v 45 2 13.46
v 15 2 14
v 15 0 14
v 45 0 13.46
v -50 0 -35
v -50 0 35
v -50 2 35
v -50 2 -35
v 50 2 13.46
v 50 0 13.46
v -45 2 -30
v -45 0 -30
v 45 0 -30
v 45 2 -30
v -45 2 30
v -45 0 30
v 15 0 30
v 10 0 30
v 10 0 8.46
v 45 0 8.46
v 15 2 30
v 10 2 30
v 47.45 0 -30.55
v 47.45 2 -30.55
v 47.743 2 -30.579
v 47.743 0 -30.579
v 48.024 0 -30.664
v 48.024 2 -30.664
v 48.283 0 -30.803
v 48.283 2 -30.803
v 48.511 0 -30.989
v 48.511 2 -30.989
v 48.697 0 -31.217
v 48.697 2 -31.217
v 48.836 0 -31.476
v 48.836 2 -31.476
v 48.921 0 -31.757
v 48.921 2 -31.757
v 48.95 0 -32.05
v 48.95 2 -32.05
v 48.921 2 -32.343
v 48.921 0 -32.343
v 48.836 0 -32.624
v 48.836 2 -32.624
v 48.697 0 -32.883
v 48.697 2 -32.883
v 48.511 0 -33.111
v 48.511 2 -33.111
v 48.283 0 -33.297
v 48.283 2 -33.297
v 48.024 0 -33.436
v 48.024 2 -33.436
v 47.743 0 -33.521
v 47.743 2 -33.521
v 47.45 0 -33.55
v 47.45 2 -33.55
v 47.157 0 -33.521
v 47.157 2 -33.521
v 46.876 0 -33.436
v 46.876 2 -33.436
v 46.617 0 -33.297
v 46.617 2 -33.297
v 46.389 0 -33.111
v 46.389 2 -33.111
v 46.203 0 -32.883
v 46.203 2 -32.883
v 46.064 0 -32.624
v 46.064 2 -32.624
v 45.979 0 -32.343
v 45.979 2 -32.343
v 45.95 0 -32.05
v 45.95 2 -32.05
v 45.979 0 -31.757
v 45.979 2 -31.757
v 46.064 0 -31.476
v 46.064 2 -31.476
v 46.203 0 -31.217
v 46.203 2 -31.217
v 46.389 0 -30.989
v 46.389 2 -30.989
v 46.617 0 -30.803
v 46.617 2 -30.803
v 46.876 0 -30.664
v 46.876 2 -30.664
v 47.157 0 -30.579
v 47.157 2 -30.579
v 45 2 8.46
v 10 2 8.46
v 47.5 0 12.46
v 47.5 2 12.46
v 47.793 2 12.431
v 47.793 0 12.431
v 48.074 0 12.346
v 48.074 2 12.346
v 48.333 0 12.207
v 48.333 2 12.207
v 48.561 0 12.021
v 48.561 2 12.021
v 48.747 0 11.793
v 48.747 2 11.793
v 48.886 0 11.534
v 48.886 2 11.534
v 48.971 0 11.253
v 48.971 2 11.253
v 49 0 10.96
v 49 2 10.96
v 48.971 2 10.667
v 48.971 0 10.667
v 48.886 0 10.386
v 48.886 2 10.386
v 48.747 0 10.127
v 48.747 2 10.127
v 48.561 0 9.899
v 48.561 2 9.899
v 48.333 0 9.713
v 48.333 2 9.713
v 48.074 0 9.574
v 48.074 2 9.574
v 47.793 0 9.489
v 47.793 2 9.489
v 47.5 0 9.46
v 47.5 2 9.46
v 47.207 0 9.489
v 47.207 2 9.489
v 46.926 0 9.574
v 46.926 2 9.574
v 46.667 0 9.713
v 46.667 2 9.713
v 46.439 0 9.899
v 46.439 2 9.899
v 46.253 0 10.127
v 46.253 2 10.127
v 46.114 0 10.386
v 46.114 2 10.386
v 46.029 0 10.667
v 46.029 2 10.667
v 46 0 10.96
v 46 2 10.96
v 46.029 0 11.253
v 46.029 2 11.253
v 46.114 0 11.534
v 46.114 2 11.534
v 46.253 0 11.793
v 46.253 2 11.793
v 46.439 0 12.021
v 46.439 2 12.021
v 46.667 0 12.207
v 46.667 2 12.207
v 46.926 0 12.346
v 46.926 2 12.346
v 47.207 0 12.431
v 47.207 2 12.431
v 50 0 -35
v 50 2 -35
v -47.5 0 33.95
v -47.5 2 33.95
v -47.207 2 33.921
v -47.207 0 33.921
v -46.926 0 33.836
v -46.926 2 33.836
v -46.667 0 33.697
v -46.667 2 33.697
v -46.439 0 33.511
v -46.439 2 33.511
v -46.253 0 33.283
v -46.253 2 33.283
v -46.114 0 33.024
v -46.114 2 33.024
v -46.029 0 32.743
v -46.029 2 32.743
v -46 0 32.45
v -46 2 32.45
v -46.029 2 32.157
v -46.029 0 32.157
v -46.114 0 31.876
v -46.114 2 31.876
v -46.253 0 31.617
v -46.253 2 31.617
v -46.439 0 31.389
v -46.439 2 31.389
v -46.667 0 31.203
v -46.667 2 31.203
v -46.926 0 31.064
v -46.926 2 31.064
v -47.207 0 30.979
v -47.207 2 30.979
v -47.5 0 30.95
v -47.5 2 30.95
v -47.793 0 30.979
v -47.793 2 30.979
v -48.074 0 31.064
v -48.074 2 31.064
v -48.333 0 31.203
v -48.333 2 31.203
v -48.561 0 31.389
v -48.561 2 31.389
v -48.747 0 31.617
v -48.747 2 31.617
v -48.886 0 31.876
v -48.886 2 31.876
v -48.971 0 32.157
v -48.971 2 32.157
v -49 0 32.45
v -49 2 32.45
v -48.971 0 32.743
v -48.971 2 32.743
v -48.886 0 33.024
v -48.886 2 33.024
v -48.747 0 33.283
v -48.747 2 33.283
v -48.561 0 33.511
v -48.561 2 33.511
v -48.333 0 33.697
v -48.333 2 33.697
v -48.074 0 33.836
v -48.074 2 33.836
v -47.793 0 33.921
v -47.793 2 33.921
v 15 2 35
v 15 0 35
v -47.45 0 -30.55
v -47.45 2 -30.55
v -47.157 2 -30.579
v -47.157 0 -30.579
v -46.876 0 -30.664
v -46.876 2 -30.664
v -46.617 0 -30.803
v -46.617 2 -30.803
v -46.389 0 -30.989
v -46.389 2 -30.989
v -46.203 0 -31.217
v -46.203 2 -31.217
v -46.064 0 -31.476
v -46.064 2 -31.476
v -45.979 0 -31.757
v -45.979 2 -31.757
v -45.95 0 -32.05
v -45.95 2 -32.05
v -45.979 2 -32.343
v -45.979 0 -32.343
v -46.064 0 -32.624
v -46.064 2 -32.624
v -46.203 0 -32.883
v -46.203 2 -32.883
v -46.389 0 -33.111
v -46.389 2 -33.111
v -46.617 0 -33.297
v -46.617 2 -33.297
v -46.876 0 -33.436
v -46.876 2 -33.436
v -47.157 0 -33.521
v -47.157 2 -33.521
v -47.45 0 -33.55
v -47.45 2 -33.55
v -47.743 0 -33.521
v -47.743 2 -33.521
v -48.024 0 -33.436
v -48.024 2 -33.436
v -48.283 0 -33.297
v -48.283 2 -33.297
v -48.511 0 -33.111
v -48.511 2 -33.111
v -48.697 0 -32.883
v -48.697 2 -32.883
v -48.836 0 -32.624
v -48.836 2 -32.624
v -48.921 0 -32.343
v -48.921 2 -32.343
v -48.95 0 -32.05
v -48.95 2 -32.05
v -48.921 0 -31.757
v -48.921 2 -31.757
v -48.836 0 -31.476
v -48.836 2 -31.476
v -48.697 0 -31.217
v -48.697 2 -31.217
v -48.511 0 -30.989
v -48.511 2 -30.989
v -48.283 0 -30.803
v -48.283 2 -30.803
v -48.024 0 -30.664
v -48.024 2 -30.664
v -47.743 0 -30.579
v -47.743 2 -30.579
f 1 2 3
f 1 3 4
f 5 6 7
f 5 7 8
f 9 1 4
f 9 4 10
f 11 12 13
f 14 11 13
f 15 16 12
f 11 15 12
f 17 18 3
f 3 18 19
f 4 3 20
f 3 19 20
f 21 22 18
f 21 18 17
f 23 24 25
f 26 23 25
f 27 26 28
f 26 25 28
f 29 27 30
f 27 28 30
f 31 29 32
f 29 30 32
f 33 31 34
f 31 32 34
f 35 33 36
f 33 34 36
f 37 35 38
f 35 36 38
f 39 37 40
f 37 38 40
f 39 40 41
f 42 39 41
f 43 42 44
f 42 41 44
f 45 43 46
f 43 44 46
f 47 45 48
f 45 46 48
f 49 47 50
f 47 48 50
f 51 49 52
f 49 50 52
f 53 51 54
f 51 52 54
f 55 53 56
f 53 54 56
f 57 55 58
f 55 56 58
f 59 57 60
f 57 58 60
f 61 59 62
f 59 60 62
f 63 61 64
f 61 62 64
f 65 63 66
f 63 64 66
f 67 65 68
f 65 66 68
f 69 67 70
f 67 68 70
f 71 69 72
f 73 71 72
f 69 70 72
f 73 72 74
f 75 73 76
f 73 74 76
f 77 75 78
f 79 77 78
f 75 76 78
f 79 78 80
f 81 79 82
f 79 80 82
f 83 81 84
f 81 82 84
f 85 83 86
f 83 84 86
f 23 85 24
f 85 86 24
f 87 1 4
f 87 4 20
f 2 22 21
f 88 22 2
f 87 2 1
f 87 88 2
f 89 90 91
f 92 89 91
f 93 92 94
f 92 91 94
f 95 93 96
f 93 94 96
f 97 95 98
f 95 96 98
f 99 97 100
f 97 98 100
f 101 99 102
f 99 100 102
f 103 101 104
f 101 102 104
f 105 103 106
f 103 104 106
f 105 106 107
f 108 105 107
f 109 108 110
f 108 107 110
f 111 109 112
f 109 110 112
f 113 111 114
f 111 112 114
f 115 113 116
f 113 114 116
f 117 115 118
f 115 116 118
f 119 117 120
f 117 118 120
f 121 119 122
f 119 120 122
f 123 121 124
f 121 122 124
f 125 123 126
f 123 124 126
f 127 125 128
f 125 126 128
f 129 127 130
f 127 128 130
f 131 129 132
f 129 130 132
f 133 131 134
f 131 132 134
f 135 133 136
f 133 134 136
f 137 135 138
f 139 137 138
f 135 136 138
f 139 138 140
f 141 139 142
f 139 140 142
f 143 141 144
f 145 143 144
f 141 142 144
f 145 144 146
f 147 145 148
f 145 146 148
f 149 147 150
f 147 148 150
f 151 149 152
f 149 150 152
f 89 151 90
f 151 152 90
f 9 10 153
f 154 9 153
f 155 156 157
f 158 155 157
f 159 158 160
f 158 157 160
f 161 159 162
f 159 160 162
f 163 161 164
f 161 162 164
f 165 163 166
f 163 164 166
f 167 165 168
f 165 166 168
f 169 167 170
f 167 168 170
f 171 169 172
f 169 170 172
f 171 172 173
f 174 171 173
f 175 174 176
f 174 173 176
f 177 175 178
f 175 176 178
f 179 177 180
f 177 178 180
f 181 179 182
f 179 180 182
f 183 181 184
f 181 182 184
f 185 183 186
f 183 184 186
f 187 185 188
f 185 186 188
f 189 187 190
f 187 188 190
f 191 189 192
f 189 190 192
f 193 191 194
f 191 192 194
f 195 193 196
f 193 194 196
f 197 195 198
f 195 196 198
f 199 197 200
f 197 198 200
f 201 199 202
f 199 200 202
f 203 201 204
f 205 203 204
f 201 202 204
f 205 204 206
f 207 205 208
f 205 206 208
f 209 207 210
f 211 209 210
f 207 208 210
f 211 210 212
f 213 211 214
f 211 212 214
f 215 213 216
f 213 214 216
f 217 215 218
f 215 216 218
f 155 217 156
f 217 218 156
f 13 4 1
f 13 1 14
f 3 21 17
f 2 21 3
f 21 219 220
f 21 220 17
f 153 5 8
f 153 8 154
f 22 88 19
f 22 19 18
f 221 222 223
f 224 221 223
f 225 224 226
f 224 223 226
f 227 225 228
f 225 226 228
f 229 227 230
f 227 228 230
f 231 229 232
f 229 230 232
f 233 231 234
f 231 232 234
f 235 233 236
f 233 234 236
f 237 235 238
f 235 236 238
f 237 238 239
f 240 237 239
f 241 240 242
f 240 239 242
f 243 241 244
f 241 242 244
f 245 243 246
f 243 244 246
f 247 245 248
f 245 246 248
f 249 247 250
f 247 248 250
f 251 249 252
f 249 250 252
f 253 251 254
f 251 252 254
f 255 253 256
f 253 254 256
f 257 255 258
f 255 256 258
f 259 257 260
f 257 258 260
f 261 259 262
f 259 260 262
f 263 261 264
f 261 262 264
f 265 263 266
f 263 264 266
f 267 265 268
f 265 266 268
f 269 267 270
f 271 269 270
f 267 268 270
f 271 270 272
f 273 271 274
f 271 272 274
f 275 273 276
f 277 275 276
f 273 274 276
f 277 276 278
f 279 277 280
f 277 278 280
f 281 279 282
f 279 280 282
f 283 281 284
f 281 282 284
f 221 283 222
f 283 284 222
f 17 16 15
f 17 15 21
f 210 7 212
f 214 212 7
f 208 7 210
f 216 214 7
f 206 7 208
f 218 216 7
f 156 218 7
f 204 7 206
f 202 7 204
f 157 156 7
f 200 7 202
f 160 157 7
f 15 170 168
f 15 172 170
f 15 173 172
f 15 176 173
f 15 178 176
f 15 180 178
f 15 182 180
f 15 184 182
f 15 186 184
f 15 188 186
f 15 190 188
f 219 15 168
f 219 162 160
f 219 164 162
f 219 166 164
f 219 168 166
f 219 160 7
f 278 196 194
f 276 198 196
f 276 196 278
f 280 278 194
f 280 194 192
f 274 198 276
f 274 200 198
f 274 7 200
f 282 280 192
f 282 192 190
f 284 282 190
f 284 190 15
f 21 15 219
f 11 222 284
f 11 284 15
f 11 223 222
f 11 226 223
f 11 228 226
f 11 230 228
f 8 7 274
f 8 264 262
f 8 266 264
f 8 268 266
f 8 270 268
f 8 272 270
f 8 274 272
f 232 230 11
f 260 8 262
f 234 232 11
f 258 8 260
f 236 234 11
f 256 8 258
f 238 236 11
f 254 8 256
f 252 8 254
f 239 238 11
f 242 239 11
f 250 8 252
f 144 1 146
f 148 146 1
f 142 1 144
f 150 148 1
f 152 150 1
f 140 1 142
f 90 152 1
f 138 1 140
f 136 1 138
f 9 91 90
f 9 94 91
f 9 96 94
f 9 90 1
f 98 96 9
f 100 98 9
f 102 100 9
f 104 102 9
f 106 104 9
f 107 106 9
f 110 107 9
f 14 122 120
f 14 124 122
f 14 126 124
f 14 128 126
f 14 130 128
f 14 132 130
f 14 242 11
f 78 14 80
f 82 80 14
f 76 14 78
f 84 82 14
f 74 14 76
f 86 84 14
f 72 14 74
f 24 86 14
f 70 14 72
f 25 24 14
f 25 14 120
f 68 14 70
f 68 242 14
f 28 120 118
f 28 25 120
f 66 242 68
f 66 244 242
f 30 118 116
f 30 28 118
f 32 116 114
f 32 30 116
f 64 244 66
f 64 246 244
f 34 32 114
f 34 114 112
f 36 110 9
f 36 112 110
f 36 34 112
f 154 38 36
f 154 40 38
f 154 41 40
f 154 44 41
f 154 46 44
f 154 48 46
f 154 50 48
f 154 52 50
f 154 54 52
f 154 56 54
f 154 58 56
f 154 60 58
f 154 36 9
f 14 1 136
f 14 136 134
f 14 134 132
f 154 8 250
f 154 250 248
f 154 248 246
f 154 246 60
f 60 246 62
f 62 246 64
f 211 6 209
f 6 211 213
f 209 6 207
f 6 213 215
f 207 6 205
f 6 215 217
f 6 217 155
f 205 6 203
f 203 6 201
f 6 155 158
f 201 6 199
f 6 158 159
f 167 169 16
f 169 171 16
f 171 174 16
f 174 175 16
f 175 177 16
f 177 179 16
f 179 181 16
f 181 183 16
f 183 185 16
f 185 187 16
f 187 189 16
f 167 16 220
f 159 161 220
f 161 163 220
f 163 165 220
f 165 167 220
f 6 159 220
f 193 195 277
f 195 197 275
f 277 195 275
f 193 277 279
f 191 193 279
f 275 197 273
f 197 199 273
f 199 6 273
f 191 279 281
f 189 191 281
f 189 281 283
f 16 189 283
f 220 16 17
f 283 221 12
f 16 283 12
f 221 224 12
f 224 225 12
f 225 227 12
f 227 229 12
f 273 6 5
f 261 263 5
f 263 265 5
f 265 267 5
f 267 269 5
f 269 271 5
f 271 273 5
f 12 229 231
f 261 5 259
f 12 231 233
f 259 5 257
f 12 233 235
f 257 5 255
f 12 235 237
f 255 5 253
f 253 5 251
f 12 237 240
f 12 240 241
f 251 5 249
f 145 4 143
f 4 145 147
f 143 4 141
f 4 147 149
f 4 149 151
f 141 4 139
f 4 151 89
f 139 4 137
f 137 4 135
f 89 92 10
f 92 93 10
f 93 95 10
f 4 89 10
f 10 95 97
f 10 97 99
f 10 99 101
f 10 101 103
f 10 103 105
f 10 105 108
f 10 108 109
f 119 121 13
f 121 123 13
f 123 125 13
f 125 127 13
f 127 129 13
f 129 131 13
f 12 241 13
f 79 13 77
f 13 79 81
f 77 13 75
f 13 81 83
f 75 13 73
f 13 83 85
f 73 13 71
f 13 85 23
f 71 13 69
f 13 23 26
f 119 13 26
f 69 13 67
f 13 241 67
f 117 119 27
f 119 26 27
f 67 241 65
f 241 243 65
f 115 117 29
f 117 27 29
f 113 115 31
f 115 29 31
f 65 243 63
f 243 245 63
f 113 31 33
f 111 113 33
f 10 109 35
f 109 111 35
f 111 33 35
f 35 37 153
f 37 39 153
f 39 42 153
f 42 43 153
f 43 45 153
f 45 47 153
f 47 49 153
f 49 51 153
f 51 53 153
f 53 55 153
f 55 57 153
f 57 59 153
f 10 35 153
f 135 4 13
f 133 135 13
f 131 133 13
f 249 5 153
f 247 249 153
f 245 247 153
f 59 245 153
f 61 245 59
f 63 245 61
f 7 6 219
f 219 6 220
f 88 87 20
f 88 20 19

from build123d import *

# Parameters (mm, degrees)
SKETCH1_W           = 100
SKETCH1_H           = 70
SKETCH1_W_2         = 90
SKETCH1_H_2         = 60
BOSS_EXTRUDE1_DEPTH = 2
SKETCH2_W           = 35
SKETCH2_H           = 21.54
CUT_EXTRUDE1_DEPTH  = 2
BOSS_EXTRUDE2_DEPTH = 2
SKETCH4_R           = 1.5
CUT_EXTRUDE2_DEPTH  = 2


with BuildPart() as part:
    # Sketch1 → Boss-Extrude1 (new body)
    with BuildSketch(Plane(origin=(0, 0, 0), x_dir=(1, 0, 0), z_dir=(0, 1, 0))):
        Rectangle(SKETCH1_W, SKETCH1_H)
        Rectangle(SKETCH1_W_2, SKETCH1_H_2, mode=Mode.SUBTRACT)
    extrude(amount=BOSS_EXTRUDE1_DEPTH)

    # Sketch2 → Cut-Extrude1 (cut)
    with BuildSketch(Plane(origin=(0, 2, 0), x_dir=(1, 0, 0), z_dir=(0, 1, 0))):
        with Locations((32.5, -24.23)):
            Rectangle(SKETCH2_W, SKETCH2_H)
    extrude(amount=-CUT_EXTRUDE1_DEPTH, mode=Mode.SUBTRACT)

    # Sketch4 → Cut-Extrude2 (cut)
    with BuildSketch(Plane(origin=(0, 2, 0), x_dir=(1, 0, 0), z_dir=(0, 1, 0))):
        with Locations(Location((-47.45, 32.05, 0), (0, 0, 270))):
            Circle(SKETCH4_R)
        with Locations(Location((47.45, 32.05, 0), (0, 0, 270))):
            Circle(SKETCH4_R)
        with Locations(Location((47.5, -10.96, 0), (0, 0, 270))):
            Circle(SKETCH4_R)
        with Locations(Location((-47.5, -32.45, 0), (0, 0, 270))):
            Circle(SKETCH4_R)
    extrude(amount=-CUT_EXTRUDE2_DEPTH, mode=Mode.SUBTRACT)


with BuildPart() as body_2:
    # Sketch3 → Boss-Extrude2 (new body)
    with BuildSketch(Plane(origin=(0, 2, 0), x_dir=(1, 0, 0), z_dir=(0, 1, 0))):
        Polygon((15, -30), (15, -14), (45, -13.46), (45, -8.46), (10, -8.46), (10, -30), align=None)
    extrude(amount=-BOSS_EXTRUDE2_DEPTH)


solid = Compound([part.part, body_2.part])
